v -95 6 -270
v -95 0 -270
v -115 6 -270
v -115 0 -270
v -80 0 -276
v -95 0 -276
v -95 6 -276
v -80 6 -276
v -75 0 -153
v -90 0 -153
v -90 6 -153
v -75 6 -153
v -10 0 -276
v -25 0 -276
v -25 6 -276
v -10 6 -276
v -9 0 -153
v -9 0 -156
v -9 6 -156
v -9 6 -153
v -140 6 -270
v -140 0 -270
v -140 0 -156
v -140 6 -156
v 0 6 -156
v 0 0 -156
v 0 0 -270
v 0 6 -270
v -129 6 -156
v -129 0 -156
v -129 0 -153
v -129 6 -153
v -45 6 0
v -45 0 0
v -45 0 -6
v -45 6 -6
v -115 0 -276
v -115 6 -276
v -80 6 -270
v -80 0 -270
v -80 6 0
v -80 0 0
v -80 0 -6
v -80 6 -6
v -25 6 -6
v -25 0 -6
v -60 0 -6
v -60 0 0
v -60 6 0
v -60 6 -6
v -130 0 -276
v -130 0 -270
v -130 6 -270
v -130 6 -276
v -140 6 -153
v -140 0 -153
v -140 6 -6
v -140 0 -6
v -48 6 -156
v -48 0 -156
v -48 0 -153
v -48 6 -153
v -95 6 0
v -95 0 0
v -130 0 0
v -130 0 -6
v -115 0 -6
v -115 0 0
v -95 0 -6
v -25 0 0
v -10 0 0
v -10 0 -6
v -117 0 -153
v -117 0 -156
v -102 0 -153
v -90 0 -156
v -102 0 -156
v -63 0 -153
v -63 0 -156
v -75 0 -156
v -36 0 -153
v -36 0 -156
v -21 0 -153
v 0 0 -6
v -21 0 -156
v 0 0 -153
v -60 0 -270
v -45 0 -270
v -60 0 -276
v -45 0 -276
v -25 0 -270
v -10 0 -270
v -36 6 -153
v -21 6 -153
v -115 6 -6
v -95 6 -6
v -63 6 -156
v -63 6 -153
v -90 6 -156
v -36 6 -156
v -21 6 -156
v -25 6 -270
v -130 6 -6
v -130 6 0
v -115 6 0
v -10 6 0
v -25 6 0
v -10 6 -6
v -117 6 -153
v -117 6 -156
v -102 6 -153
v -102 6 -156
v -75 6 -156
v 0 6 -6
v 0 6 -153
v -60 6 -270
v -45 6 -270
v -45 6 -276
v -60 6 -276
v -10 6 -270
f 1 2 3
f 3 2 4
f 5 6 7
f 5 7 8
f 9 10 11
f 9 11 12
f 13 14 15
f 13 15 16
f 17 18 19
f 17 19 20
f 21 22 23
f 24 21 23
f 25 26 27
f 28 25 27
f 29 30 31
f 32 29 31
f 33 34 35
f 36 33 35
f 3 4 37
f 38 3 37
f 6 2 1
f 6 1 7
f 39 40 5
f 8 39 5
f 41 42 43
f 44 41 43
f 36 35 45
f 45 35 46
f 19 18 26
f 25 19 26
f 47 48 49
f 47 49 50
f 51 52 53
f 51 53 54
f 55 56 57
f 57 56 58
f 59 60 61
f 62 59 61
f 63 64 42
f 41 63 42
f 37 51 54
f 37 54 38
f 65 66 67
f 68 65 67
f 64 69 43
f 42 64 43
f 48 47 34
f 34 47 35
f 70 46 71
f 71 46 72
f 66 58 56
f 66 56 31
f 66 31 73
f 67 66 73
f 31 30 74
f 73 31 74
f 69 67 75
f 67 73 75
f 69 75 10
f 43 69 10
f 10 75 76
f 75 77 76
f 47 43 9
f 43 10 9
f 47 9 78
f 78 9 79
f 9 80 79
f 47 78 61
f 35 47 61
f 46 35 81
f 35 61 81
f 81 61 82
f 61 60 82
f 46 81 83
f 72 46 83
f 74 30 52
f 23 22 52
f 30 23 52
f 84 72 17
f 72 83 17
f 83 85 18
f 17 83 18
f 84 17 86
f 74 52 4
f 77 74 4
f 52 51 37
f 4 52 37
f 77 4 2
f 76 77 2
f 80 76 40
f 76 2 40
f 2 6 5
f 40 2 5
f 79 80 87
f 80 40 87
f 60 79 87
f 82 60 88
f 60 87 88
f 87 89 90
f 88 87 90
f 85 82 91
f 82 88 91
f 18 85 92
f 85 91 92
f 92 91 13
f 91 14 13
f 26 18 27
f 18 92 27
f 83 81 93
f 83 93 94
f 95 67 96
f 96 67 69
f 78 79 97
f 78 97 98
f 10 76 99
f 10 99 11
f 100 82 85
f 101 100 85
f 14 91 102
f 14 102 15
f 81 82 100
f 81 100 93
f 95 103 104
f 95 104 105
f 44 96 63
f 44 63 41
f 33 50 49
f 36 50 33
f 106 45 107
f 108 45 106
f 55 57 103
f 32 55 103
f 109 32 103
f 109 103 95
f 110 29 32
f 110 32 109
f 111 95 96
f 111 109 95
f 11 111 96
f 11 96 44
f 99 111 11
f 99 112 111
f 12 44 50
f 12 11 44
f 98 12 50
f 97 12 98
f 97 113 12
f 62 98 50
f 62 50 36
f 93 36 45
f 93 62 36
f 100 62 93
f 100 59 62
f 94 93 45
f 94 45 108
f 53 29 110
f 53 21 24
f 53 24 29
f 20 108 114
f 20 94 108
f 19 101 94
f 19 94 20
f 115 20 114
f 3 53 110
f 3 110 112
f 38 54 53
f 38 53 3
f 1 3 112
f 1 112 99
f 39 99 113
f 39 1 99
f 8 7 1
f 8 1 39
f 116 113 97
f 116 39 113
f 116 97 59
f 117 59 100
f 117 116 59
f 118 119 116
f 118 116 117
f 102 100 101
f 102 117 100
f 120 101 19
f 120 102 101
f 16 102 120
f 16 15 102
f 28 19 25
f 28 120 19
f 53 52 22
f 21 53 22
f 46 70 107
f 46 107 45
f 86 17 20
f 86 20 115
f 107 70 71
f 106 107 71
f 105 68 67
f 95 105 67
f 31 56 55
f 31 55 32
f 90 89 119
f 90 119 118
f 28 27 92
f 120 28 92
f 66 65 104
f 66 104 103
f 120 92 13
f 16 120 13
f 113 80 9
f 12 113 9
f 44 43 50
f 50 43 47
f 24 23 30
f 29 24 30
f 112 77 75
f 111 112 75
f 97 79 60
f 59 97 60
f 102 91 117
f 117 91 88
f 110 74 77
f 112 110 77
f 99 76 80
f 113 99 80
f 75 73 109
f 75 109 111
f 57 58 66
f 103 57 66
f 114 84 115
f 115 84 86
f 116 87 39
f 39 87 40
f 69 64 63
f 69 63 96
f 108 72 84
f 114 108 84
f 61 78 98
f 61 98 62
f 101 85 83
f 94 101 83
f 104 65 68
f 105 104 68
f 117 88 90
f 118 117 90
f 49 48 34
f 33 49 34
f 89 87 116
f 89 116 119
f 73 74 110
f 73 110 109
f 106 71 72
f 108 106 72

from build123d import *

# Parameters (mm, degrees)
ESQUISSE1_W             = 15
ESQUISSE1_H             = 6
BOSS_EXTRU_1_DEPTH      = 6
ESQUISSE2_W             = 15
ESQUISSE2_H             = 3
ENL_V_MAT_EXTRU_1_DEPTH = 6


with BuildPart() as part:
    # Esquisse1 → Boss.-Extru.1 (new body)
    with BuildSketch(Plane(origin=(0, 0, 0), x_dir=(1, 0, 0), z_dir=(0, 1, 0))):
        with Locations((-122.5, 273)):
            Rectangle(ESQUISSE1_W, ESQUISSE1_H)
        with Locations((-87.5, 273)):
            Rectangle(ESQUISSE1_W, ESQUISSE1_H)
        with Locations((-52.5, 273)):
            Rectangle(ESQUISSE1_W, ESQUISSE1_H)
        with Locations((-17.5, 273)):
            Rectangle(ESQUISSE1_W, ESQUISSE1_H)
        Polygon((-140, 270), (-140, 138), (0, 138), (0, 270), (-10, 270), (-25, 270), (-45, 270), (-60, 270), (-80, 270), (-95, 270), (-115, 270), (-130, 270), align=None)
        Polygon((0, 138), (-140, 138), (-140, 6), (-130, 6), (-115, 6), (-95, 6), (-80, 6), (-60, 6), (-45, 6), (-25, 6), (-10, 6), (0, 6), align=None)
        with Locations((-122.5, 3)):
            Rectangle(ESQUISSE1_W, ESQUISSE1_H)
        with Locations((-87.5, 3)):
            Rectangle(ESQUISSE1_W, ESQUISSE1_H)
        with Locations((-52.5, 3)):
            Rectangle(ESQUISSE1_W, ESQUISSE1_H)
        with Locations((-17.5, 3)):
            Rectangle(ESQUISSE1_W, ESQUISSE1_H)
    extrude(amount=BOSS_EXTRU_1_DEPTH)

    # Esquisse2 → Enlèv. mat.-Extru.1 (cut)
    with BuildSketch(Plane.XZ):
        with Locations((-1.5, -154.5)):
            Rectangle(ESQUISSE2_W, ESQUISSE2_H)
        with Locations((-28.5, -154.5)):
            Rectangle(ESQUISSE2_W, ESQUISSE2_H)
        with Locations((-55.5, -154.5)):
            Rectangle(ESQUISSE2_W, ESQUISSE2_H)
        with Locations((-82.5, -154.5)):
            Rectangle(ESQUISSE2_W, ESQUISSE2_H)
        with Locations((-109.5, -154.5)):
            Rectangle(ESQUISSE2_W, ESQUISSE2_H)
        with Locations((-136.5, -154.5)):
            Rectangle(ESQUISSE2_W, ESQUISSE2_H)
    extrude(amount=-ENL_V_MAT_EXTRU_1_DEPTH, mode=Mode.SUBTRACT)


solid = part.part
